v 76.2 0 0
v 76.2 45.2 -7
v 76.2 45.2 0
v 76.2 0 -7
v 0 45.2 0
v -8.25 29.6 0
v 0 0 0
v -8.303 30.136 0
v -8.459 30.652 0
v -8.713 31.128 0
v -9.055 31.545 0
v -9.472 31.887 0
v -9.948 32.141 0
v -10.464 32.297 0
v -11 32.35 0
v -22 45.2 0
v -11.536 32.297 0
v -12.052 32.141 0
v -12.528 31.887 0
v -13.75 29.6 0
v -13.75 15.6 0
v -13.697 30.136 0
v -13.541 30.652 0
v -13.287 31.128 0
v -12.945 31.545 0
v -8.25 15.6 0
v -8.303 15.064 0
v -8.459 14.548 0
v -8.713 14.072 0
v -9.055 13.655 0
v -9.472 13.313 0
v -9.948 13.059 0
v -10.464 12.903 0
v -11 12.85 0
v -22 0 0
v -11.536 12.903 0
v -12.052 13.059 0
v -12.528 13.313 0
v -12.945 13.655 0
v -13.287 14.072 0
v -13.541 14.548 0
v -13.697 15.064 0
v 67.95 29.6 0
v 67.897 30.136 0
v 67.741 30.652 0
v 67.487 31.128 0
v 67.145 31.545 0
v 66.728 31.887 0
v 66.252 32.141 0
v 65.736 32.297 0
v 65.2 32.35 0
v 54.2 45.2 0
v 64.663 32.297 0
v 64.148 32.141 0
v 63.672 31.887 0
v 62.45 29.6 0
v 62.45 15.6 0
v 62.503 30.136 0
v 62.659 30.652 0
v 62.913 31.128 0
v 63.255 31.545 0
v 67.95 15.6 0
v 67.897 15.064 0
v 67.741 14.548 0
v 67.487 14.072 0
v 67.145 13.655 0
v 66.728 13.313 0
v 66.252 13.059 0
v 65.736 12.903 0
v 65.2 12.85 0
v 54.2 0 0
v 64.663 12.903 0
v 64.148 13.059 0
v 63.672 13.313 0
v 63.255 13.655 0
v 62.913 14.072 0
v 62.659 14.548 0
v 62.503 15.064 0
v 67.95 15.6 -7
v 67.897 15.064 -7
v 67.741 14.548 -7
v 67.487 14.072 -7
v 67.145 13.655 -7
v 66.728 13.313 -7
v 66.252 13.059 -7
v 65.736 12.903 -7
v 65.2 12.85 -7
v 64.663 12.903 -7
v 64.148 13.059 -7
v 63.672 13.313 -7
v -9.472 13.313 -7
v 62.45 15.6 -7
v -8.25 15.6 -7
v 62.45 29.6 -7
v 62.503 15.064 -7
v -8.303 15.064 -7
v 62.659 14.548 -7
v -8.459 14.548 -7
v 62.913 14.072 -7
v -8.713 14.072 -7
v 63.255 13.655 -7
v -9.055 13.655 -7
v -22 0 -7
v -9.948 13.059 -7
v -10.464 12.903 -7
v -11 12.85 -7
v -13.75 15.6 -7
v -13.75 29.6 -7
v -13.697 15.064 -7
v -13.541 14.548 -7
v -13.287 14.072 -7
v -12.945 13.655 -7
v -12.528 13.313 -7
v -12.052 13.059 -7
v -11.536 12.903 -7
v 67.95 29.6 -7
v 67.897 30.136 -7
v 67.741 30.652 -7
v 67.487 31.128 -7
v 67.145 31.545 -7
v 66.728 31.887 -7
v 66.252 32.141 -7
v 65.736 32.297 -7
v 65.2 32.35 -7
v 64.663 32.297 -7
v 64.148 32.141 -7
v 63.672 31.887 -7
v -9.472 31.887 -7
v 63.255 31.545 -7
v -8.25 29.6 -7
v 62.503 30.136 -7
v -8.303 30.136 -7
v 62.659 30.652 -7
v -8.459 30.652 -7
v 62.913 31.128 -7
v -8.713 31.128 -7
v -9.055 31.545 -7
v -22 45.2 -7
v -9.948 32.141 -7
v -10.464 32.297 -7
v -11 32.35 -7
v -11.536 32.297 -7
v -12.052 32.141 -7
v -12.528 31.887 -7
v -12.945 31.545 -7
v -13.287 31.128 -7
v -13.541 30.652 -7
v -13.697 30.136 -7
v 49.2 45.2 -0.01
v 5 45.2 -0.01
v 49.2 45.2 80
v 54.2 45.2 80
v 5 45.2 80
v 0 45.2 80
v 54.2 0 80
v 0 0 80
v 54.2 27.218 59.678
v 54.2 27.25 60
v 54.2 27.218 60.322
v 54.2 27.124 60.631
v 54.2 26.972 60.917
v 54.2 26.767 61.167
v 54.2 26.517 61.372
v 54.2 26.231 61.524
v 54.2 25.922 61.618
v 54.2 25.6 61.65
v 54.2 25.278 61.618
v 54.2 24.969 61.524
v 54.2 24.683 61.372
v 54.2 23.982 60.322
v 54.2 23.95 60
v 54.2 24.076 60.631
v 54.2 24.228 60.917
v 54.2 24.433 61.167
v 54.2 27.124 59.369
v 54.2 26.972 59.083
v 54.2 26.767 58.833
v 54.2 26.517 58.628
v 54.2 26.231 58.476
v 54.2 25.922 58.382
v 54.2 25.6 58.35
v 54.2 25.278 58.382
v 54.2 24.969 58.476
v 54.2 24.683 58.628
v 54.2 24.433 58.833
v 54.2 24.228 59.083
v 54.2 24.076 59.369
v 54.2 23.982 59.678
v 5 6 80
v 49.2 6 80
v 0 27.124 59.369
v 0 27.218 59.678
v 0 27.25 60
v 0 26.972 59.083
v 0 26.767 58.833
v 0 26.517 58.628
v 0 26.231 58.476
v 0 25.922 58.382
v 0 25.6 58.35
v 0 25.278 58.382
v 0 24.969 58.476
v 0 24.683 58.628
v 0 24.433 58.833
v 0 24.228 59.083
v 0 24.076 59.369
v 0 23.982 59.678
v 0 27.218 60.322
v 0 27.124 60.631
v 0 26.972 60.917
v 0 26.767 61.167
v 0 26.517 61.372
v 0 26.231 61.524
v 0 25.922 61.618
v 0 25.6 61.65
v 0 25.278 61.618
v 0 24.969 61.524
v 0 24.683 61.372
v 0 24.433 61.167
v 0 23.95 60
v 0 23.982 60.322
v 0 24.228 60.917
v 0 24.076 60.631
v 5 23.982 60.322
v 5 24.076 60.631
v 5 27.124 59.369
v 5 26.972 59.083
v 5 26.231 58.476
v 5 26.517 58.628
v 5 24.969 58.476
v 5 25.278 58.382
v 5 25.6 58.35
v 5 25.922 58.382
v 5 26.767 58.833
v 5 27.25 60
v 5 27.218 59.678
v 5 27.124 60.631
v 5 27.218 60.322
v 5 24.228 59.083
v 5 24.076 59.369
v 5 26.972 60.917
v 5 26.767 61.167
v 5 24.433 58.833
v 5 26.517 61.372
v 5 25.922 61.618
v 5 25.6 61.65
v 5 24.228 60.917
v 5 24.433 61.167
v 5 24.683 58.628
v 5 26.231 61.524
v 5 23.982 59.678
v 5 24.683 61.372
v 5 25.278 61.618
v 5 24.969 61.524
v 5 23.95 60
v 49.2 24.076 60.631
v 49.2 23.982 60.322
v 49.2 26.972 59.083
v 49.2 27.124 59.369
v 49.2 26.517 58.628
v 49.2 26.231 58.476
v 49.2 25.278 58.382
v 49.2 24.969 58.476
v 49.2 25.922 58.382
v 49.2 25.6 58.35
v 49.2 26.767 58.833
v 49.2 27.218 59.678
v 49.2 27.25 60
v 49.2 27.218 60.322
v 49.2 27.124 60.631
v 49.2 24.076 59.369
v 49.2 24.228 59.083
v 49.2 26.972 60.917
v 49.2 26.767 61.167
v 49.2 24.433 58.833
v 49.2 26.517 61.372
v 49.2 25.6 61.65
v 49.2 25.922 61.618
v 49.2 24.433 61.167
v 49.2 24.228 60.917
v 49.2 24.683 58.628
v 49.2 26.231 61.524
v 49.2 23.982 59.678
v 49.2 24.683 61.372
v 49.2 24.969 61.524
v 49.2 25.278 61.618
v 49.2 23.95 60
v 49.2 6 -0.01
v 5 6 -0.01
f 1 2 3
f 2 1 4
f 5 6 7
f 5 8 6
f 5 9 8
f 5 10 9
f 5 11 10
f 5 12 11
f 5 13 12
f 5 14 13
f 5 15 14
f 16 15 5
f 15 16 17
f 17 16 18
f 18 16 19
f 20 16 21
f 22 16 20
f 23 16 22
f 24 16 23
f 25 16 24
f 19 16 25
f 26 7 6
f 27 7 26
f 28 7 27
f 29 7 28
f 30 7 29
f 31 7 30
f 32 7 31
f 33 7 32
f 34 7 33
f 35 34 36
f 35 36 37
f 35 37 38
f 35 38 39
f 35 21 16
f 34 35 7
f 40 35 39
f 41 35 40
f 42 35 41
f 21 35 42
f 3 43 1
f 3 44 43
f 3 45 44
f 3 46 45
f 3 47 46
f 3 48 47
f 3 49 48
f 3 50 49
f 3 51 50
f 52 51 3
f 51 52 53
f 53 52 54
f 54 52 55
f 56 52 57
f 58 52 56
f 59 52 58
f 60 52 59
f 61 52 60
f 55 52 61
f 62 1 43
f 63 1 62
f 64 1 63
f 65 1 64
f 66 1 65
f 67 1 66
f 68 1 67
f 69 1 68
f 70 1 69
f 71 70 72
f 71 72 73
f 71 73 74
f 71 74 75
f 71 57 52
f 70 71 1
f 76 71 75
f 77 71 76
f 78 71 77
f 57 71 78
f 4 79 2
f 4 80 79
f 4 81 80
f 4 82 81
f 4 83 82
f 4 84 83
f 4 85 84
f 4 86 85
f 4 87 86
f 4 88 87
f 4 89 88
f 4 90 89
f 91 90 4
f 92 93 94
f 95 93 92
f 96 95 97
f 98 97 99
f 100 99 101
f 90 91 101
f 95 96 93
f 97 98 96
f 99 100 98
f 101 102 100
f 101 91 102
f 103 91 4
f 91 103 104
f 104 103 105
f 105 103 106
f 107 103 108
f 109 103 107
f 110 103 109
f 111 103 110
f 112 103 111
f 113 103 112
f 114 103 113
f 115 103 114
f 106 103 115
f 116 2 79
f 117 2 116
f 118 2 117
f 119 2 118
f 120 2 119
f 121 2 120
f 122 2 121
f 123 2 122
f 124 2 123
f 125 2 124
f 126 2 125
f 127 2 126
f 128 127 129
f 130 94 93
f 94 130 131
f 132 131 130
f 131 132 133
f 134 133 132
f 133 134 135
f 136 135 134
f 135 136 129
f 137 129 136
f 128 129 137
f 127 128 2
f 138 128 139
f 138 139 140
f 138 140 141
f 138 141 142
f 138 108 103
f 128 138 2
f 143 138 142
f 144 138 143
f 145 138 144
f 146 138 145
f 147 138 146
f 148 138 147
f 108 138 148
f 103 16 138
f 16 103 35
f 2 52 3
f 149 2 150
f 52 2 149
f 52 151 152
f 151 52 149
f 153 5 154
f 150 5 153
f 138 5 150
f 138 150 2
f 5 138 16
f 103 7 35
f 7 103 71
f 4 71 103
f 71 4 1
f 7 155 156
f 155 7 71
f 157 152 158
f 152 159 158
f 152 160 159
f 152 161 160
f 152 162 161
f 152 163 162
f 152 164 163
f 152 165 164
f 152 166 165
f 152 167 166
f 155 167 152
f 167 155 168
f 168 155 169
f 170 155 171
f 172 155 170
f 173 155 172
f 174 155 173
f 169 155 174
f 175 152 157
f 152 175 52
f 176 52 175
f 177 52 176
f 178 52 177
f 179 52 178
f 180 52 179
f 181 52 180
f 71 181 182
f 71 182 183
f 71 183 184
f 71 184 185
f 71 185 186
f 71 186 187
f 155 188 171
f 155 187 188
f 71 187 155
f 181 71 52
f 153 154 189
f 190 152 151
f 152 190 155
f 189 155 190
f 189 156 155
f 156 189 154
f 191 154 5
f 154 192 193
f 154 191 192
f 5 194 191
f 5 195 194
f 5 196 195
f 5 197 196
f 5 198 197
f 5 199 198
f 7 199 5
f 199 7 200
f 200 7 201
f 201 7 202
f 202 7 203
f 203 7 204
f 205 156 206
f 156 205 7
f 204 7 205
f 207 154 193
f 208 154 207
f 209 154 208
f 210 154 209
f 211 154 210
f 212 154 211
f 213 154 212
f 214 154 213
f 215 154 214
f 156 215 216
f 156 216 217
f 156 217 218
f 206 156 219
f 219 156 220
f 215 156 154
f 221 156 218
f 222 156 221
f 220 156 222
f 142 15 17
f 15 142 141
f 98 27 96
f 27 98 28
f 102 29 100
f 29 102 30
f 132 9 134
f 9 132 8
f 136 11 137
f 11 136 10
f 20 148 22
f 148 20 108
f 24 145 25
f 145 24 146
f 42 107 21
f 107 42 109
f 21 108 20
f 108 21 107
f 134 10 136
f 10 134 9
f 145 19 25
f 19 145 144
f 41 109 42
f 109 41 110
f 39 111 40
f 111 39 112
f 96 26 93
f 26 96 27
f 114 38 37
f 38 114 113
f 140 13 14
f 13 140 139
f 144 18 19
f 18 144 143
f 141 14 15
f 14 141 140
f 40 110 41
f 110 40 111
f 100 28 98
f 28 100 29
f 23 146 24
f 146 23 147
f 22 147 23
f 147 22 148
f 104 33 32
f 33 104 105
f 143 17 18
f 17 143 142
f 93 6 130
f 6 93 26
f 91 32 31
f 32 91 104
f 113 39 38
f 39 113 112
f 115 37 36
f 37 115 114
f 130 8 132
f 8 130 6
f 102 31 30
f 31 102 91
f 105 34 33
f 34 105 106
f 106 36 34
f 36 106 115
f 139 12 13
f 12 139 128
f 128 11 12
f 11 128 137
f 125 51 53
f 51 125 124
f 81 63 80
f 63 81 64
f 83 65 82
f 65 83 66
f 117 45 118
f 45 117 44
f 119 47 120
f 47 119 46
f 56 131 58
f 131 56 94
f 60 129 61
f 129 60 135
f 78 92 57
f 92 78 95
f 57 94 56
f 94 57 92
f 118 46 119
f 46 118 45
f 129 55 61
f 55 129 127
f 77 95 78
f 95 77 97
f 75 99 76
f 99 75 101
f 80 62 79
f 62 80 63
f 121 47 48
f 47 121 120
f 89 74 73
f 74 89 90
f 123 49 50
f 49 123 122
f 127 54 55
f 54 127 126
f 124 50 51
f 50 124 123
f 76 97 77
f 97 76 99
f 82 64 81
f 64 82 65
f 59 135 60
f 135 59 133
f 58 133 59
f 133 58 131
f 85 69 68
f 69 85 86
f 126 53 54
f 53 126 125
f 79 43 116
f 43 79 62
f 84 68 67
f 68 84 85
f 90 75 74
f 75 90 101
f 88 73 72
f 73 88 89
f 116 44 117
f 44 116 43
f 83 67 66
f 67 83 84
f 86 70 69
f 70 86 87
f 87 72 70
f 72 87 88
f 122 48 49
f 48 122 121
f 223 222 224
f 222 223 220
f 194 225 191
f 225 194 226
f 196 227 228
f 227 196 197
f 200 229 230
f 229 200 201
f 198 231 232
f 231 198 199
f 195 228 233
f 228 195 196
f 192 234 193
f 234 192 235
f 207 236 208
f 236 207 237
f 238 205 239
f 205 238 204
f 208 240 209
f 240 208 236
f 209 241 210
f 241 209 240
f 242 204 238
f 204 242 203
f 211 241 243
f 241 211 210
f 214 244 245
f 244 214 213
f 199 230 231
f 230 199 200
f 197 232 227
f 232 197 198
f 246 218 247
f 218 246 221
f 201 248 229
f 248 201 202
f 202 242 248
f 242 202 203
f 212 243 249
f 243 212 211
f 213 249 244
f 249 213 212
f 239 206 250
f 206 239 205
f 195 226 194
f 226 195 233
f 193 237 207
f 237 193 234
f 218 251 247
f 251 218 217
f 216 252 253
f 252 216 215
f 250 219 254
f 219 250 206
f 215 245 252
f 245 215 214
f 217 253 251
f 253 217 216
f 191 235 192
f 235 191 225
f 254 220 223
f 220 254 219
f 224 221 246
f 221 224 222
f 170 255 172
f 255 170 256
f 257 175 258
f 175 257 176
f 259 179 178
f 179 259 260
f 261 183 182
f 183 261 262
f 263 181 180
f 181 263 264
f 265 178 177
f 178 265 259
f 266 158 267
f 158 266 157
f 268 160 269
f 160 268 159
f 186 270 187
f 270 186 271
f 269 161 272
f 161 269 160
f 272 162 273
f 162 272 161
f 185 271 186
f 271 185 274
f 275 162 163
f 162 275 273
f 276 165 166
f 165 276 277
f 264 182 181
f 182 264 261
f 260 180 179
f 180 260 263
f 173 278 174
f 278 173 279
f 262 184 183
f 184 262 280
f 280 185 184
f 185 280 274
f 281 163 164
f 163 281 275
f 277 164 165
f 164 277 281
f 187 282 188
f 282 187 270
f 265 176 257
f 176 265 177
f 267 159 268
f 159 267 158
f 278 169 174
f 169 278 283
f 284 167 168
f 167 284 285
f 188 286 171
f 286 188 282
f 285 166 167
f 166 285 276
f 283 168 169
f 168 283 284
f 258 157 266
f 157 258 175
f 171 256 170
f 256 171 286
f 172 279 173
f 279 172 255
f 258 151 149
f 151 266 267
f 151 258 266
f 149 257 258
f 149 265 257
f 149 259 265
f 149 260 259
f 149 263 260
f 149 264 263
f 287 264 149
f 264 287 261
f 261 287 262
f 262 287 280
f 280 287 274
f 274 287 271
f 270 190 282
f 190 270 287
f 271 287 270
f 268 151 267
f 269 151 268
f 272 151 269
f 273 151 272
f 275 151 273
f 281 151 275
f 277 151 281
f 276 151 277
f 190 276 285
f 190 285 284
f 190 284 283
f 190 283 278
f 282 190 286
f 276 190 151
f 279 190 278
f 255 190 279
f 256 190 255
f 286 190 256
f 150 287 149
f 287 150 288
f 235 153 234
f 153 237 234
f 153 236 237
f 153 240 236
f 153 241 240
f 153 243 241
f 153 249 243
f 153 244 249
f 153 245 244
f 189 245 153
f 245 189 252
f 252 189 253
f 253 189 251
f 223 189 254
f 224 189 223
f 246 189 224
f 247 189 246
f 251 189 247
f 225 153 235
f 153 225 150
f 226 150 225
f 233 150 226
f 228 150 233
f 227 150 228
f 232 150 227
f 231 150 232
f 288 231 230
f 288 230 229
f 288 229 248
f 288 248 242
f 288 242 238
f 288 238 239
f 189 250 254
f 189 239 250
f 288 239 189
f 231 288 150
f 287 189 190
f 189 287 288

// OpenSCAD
// Zebra LI2208 Barcode Scanner Holder — Hamilton STARlet RHS mount
//
// Orientation: handle slides in from the top, scan head points horizontally
//              into the deck work area.
//
// Structure:
//   BASE PLATE  — full footprint, two M5 slots for deck attachment
//   C-CHANNEL   — three solid walls (back, left, right), open at front (+Y)
//   CLAMP HOLES — M3 through-holes in side walls; thumb screws lock scanner in place
//
// Print: back face down. No supports needed.
// Material: PETG, 4 perimeters, 40% infill.
//
// VERIFY handle_w and handle_d against the physical scanner before printing.

// ─── Scanner handle cross-section — MEASURE AND VERIFY ───────────
handle_w  = 43.0;   // handle width  (X) — verify against physical unit
handle_d  = 38.0;   // handle depth  (Y) — verify against physical unit
grip_l    = 80.0;   // grip channel length (Z)
cl        =  0.6;   // clearance each side

// ─── Wall thicknesses ─────────────────────────────────────────────
back_wall  =  6.0;   // back plate (Y — away from operator)
side_wall  =  5.0;   // left and right walls (X)

// ─── Base plate ───────────────────────────────────────────────────
base_t    =  7.0;   // base plate thickness (Z, below channel)
base_ext  = 22.0;   // base extends this far beyond channel on each side (X)

// ─── M5 mounting slots in base (for deck attachment) ──────────────
slot_d    =  5.5;   // slot width (M5 clearance)
slot_l    = 14.0;   // slot travel in Y (front-back adjustment)
slot_inset = 11.0;  // slot centre from outer edge of base (X)

// ─── M3 clamp screws through side walls ───────────────────────────
clamp_d   =  3.3;   // M3 clearance hole
clamp_z   = grip_l * 0.75;  // height of clamp hole above base top face

// ─── Derived ──────────────────────────────────────────────────────
inner_w  = handle_w + 2 * cl;
inner_d  = handle_d + 2 * cl;
outer_w  = inner_w + 2 * side_wall;
outer_d  = inner_d + back_wall;
base_w   = outer_w + 2 * base_ext;
cx       = outer_w / 2;

eps = 0.01;
$fn = 48;

module slot_hole() {
    hull()
        for (dy = [-slot_l/2, slot_l/2])
            translate([0, dy, 0])
                cylinder(d = slot_d, h = base_t + 2*eps, $fn = 32);
}

difference() {
    union() {
        // ── Base plate — full footprint ───────────────────────────
        translate([-base_ext, 0, -base_t])
            cube([base_w, outer_d, base_t]);

        // ── C-channel body ────────────────────────────────────────
        cube([outer_w, outer_d, grip_l]);
    }

    // ── Handle channel (open at +Y front, full grip length) ───────
    translate([side_wall, back_wall, -eps])
        cube([inner_w, inner_d + eps, grip_l + 2*eps]);

    // ── Mounting slots through base (elongated in Y) ──────────────
    for (sx = [-(base_ext - slot_inset), outer_w + base_ext - slot_inset])
        translate([sx, outer_d / 2, -base_t - eps])
            slot_hole();

    // ── M3 clamp holes through side walls ─────────────────────────
    for (cx = [side_wall / 2, outer_w - side_wall / 2])
        translate([cx, back_wall + inner_d / 2, clamp_z])
            rotate([0, 90, 0])
                cylinder(d = clamp_d, h = side_wall + 2*eps, center = true, $fn = 32);

    // ── Engraved label on back face ───────────────────────────────
    translate([cx, -eps, grip_l * 0.80])
        rotate([90, 0, 0])
            linear_extrude(0.8 + eps)
                text("LI2208", size = 5.5, font = "Arial:style=Bold",
                     halign = "center", valign = "center");
    translate([cx, -eps, grip_l * 0.60])
        rotate([90, 0, 0])
            linear_extrude(0.8 + eps)
                text(str("hw=",handle_w,"  hd=",handle_d,"  l=",grip_l),
                     size = 3.2, font = "Arial",
                     halign = "center", valign = "center");
}
